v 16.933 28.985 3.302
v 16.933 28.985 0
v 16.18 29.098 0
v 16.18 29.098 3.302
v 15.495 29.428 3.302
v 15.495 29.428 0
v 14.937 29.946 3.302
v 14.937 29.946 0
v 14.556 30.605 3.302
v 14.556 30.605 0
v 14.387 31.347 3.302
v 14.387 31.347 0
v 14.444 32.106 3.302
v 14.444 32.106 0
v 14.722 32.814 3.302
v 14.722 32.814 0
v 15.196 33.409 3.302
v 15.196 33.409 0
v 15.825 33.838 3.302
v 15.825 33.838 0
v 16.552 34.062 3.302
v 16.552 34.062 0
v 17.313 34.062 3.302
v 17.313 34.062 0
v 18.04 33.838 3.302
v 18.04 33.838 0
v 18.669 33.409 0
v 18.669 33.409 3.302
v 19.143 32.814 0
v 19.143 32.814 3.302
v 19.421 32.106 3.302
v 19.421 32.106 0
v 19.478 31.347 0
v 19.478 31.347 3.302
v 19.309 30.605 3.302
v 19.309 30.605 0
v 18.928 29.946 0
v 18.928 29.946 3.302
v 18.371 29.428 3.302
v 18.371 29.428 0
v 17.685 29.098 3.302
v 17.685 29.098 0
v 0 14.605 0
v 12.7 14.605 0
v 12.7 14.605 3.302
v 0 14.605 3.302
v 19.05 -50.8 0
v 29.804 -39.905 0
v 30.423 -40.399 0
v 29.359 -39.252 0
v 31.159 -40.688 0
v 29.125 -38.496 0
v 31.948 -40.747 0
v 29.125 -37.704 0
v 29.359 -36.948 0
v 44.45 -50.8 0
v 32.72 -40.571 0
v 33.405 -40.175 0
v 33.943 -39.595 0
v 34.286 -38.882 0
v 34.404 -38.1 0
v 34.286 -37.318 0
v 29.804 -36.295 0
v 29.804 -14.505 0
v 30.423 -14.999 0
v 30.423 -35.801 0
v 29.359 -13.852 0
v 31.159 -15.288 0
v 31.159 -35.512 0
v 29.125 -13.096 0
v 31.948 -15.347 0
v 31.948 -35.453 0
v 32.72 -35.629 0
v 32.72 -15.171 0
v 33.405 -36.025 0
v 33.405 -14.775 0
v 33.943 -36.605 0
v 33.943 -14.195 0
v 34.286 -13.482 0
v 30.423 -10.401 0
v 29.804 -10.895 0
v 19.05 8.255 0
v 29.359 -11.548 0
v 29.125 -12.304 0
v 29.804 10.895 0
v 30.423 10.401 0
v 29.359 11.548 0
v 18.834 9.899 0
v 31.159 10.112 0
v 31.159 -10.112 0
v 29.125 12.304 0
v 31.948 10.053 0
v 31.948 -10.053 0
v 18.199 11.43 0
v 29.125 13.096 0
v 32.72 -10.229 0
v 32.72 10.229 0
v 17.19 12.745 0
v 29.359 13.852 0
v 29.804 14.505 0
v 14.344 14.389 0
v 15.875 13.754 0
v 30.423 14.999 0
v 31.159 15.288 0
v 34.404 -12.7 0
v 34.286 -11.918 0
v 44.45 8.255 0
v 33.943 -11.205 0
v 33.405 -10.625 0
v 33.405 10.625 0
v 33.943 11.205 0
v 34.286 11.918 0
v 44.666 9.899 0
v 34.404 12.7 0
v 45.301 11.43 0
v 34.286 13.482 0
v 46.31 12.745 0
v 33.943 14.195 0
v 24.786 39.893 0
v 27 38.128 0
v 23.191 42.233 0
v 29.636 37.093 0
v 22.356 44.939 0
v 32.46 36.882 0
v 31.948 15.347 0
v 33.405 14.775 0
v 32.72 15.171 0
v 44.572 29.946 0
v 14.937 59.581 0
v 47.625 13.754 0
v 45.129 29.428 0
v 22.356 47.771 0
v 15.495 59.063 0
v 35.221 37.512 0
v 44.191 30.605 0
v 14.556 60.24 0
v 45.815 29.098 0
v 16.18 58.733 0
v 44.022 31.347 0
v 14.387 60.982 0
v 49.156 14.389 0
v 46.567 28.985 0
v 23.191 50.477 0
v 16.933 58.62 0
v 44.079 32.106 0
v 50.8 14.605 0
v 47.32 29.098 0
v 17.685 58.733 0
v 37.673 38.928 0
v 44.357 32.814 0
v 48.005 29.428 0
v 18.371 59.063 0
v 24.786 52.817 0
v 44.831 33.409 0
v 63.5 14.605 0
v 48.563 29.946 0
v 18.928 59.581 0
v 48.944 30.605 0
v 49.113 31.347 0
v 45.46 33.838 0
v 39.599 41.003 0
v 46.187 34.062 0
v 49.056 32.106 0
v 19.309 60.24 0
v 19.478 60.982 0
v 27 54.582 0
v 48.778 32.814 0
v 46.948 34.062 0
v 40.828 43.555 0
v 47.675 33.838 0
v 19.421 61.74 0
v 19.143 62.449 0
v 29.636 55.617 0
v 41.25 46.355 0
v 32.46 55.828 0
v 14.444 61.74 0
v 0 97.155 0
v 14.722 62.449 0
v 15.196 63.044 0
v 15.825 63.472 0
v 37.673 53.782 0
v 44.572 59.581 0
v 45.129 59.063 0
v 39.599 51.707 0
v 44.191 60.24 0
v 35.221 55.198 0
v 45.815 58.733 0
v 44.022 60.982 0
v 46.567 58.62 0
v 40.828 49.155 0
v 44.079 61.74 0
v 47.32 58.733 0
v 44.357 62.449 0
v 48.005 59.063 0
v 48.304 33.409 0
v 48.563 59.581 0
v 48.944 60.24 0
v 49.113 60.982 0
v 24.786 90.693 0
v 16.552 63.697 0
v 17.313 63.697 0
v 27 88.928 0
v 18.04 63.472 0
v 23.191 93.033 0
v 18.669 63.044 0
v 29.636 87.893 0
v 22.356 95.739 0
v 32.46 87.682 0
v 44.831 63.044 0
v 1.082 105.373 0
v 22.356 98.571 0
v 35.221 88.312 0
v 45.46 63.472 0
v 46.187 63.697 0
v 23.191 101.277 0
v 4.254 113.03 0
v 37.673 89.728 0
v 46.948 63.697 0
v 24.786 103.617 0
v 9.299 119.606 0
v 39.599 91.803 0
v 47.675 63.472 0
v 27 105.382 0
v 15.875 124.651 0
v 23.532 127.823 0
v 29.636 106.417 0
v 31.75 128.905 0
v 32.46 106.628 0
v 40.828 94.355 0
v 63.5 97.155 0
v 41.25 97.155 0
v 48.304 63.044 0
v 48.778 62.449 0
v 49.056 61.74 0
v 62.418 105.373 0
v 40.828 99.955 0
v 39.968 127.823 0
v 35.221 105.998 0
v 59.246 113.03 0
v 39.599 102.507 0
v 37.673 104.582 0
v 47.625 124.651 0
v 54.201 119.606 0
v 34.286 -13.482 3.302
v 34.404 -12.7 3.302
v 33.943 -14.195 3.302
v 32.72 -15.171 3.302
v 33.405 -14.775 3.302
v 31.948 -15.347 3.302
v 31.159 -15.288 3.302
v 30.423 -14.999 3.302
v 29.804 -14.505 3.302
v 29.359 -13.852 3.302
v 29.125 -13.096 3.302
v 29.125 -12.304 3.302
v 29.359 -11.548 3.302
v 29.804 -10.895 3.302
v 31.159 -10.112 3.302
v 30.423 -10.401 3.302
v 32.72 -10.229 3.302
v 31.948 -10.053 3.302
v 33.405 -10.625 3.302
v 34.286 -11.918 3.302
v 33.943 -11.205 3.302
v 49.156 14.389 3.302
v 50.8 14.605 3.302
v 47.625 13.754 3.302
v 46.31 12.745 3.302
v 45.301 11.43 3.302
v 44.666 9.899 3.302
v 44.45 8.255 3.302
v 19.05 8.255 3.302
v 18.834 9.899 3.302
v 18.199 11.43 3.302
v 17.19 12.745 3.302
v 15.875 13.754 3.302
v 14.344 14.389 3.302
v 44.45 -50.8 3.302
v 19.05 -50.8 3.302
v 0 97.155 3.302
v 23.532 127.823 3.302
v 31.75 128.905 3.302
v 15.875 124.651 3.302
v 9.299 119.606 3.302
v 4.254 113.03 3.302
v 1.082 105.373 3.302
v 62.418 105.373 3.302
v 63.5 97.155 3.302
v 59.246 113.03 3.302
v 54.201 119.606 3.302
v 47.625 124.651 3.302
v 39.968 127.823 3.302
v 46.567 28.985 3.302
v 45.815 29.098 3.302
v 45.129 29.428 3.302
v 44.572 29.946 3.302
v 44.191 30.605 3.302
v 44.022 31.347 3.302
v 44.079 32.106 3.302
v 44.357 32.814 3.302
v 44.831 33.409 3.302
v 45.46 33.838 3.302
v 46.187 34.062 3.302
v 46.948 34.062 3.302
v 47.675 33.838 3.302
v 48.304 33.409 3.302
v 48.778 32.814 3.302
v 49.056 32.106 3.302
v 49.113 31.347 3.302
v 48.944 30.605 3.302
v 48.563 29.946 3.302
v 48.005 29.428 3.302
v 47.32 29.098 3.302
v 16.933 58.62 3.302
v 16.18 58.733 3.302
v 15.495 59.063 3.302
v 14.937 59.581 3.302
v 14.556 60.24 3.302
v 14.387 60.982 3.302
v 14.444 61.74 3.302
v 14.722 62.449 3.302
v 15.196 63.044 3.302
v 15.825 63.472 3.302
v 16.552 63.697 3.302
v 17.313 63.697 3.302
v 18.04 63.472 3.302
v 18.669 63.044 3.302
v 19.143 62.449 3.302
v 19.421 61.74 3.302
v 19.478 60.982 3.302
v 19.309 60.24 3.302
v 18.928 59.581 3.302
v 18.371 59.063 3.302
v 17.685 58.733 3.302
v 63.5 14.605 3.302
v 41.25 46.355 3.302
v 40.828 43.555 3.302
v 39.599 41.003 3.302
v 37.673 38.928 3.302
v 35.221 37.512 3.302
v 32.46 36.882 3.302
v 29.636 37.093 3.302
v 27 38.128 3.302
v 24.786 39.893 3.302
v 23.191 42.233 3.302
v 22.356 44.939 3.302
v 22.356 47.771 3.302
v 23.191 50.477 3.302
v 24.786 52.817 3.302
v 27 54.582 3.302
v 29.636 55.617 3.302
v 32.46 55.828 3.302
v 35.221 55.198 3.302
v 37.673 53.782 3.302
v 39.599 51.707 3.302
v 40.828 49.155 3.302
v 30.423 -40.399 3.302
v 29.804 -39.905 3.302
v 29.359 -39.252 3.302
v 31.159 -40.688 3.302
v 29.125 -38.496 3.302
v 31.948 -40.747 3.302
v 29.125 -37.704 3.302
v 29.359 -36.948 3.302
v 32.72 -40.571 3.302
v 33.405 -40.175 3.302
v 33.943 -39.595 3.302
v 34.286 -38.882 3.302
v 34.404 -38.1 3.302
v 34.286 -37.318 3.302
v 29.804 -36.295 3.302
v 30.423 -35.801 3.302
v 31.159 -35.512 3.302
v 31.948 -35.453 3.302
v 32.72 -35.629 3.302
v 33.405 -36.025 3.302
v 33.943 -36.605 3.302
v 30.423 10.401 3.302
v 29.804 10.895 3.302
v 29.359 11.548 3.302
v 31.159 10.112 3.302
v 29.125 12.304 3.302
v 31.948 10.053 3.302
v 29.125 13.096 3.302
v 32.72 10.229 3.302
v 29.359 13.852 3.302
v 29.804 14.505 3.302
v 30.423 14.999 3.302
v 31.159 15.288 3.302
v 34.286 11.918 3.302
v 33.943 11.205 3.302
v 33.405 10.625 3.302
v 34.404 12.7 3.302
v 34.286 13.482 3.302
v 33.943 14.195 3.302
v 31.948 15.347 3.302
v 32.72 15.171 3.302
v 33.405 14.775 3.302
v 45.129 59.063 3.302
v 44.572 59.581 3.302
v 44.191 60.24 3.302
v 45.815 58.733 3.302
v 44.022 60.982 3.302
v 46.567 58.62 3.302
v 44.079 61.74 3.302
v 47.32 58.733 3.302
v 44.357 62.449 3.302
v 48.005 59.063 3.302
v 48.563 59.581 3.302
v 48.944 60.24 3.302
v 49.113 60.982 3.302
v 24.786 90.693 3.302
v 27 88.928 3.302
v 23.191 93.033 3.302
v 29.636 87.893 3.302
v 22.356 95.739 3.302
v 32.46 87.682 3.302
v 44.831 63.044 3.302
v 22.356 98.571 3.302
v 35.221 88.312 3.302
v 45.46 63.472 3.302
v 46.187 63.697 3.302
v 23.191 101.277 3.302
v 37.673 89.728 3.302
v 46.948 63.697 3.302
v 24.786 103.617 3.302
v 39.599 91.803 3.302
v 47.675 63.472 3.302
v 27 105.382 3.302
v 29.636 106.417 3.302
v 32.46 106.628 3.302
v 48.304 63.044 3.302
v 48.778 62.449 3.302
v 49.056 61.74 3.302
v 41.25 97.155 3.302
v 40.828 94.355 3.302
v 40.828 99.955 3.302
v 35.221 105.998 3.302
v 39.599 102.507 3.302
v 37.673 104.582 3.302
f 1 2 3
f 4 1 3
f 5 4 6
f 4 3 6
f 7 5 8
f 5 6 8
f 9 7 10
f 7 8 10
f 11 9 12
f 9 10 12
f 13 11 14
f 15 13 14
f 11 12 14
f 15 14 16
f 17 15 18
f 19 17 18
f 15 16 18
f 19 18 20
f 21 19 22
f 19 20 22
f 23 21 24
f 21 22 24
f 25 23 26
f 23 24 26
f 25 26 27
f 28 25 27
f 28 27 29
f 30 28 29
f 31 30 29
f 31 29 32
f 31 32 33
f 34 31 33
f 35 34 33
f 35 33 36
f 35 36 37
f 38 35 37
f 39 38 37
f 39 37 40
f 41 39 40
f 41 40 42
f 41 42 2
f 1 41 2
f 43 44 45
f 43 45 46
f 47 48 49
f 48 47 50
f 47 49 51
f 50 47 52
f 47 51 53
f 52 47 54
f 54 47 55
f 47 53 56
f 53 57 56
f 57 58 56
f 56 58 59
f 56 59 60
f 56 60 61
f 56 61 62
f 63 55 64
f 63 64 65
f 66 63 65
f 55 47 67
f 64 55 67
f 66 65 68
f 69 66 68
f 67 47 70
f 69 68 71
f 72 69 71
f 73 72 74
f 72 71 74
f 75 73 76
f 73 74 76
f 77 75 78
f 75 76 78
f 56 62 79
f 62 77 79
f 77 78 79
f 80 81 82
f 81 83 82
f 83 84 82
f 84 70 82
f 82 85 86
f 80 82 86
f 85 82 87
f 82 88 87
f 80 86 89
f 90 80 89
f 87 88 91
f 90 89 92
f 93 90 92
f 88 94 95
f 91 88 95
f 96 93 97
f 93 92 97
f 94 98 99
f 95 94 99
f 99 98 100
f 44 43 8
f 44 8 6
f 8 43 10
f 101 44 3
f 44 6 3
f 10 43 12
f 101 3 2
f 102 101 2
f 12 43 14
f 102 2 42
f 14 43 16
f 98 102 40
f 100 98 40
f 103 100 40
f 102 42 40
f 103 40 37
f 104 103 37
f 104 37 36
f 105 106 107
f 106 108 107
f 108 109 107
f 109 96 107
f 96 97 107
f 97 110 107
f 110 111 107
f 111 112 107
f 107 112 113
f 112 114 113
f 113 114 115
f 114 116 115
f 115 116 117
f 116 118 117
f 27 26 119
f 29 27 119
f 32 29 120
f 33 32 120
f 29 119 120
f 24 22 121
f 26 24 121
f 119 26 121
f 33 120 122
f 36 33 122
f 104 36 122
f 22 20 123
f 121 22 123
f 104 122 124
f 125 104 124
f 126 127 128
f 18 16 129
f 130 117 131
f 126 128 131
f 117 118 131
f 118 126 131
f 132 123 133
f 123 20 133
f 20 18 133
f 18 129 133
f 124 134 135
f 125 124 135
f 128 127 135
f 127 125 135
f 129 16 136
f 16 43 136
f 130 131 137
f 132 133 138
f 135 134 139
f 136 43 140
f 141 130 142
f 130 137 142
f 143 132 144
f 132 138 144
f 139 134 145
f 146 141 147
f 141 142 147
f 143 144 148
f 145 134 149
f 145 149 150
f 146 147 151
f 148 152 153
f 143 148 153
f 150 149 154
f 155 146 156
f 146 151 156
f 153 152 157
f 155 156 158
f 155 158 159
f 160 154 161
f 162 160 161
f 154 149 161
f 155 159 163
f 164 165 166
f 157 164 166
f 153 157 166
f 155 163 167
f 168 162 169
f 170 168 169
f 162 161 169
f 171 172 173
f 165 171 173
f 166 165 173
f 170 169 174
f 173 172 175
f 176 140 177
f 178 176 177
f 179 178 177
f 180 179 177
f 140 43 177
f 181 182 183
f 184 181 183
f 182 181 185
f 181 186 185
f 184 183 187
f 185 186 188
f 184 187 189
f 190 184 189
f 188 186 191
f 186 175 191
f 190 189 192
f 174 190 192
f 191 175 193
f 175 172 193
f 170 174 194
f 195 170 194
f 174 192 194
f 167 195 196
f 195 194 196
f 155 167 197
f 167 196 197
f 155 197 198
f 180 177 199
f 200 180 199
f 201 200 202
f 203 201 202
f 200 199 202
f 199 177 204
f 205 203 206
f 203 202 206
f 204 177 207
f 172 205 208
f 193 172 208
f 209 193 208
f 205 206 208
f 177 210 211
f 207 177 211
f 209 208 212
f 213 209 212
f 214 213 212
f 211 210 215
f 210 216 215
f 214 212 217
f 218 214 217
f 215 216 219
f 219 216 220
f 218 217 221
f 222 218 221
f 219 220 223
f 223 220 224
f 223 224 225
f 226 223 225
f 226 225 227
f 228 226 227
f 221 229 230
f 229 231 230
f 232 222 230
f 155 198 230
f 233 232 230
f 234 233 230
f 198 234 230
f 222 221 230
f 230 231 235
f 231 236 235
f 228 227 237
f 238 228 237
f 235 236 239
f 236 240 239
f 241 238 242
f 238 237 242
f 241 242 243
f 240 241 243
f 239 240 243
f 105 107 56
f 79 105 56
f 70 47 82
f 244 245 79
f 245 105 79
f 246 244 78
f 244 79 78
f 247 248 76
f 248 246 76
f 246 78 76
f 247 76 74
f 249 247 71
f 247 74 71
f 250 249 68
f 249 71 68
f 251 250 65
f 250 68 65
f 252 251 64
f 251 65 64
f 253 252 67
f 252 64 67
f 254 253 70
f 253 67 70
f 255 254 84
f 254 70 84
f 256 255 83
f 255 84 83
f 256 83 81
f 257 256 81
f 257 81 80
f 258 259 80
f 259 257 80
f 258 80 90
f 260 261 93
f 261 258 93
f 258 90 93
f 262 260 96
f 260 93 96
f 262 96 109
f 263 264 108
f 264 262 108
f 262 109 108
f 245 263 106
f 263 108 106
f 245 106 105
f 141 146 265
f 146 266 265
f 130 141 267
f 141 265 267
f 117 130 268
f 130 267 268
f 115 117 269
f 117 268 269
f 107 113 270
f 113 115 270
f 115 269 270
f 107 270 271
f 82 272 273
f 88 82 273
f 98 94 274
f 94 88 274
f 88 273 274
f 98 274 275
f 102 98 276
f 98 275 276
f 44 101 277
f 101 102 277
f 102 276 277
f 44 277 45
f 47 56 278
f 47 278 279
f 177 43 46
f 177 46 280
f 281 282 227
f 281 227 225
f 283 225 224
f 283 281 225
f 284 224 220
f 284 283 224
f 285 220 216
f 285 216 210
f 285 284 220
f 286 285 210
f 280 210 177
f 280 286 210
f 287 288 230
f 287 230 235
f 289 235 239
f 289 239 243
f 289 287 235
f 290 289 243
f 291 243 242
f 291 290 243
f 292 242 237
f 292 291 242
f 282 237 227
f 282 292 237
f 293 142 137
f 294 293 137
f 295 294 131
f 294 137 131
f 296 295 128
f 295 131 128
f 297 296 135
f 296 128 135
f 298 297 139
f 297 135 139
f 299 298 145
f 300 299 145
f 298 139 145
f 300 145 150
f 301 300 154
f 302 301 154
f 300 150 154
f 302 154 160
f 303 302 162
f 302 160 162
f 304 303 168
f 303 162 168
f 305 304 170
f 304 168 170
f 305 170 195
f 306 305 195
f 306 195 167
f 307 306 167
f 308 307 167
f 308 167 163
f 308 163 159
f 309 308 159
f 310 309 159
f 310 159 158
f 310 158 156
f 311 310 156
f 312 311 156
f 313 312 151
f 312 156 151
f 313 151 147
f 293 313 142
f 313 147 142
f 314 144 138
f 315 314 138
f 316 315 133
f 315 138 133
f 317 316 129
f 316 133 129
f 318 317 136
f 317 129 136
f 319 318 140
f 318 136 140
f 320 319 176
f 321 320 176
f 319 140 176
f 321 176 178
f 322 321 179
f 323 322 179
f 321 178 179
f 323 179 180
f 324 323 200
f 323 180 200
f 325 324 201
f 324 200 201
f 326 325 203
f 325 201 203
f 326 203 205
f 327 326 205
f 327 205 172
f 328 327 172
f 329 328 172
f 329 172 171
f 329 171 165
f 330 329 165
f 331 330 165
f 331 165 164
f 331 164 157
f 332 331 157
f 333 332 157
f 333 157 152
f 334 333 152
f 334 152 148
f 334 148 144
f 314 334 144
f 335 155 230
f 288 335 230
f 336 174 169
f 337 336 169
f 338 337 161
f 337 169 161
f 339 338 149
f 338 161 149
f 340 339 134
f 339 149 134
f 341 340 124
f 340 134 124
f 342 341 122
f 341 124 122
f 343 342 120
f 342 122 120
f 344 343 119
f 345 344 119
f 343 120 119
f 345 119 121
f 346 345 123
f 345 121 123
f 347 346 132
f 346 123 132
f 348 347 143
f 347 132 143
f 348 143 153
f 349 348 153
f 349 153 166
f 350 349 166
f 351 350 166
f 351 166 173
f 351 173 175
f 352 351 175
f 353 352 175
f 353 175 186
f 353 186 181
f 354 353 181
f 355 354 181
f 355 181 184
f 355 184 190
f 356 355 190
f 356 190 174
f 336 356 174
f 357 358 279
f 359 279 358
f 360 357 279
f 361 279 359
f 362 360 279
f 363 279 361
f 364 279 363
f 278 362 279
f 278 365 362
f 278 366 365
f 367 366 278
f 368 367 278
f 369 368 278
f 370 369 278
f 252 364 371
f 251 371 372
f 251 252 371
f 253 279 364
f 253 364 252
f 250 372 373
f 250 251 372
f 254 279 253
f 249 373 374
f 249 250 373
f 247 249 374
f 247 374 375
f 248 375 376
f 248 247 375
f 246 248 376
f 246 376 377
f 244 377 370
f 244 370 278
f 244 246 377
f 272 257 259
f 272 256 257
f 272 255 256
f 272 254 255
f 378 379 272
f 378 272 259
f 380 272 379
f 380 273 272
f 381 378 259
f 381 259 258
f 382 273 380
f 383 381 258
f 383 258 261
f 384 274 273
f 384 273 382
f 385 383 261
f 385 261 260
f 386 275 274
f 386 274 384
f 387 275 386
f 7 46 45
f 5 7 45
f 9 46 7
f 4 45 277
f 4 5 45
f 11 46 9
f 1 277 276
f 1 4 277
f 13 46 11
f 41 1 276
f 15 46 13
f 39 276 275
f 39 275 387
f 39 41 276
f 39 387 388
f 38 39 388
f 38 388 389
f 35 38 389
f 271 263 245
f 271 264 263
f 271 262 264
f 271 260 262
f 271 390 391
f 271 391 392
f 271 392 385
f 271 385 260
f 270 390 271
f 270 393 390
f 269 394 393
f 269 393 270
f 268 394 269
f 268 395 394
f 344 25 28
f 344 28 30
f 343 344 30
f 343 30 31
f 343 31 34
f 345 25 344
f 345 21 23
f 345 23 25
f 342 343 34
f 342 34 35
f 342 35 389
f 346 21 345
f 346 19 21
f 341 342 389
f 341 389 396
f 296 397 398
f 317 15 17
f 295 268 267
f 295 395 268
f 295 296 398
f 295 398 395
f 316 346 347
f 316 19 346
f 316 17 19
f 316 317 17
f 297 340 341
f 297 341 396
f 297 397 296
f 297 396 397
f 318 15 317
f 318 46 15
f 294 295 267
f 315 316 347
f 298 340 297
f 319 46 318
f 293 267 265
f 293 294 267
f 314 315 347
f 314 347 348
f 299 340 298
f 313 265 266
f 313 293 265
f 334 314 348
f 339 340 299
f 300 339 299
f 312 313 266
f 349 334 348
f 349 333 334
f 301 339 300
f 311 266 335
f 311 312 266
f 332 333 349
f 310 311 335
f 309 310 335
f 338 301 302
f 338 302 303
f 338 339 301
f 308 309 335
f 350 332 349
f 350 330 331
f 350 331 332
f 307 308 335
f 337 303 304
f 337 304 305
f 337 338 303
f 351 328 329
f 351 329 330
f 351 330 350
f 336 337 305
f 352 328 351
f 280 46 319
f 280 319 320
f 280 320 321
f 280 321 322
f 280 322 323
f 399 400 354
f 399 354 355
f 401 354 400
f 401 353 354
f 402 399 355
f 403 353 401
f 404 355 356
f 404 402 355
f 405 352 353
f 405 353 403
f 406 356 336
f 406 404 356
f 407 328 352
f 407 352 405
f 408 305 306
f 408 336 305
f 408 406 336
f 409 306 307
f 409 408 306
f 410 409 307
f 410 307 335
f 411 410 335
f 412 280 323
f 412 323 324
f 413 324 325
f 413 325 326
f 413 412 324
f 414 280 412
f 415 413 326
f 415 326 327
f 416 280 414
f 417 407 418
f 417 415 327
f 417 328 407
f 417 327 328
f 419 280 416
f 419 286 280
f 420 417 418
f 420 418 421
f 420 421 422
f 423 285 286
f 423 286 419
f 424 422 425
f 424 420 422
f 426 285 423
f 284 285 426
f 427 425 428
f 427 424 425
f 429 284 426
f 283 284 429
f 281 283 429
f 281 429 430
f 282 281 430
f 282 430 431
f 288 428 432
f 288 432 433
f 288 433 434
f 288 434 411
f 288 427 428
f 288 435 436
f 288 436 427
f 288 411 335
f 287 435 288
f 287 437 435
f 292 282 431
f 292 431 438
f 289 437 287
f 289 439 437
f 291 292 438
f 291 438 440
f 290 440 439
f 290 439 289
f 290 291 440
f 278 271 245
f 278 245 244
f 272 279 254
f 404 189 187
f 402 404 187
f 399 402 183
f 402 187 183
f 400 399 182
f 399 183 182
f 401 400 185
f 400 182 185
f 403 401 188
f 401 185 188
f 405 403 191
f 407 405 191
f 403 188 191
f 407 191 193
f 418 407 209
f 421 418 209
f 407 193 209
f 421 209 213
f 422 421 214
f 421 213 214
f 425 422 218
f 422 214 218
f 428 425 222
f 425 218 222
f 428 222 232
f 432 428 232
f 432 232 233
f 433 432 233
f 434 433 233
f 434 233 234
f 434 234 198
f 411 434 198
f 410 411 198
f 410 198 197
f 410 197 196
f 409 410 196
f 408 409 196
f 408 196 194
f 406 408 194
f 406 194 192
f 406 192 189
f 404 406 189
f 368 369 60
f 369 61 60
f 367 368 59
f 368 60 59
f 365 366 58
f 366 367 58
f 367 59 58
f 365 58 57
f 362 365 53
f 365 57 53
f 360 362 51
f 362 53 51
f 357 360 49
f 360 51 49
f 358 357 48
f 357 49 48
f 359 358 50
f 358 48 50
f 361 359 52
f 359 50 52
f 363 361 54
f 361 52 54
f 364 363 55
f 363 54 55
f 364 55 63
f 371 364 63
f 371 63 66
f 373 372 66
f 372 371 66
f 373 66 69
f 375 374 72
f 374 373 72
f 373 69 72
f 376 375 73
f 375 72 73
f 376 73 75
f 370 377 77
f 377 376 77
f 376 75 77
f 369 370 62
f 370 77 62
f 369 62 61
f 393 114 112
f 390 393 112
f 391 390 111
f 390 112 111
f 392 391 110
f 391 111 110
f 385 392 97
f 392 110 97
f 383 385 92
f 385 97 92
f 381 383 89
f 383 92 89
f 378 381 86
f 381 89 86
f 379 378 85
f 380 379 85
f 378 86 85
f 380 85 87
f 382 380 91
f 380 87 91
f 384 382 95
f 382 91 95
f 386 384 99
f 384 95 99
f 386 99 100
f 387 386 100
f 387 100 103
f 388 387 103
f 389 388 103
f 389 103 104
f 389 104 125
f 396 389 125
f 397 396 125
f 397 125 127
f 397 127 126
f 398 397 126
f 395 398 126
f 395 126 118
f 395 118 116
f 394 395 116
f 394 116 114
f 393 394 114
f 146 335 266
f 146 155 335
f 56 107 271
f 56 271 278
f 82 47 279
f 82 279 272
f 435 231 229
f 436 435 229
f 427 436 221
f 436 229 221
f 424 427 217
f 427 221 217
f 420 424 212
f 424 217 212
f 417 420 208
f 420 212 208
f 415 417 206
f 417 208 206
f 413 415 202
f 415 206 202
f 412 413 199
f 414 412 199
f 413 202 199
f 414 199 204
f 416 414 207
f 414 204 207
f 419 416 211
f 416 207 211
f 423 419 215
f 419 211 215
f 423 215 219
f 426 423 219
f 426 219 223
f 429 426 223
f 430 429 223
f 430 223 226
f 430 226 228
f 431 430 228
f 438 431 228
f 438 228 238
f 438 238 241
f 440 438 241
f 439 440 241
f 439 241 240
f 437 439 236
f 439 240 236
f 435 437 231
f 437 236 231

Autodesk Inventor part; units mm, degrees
ref_plane "YZ Plane" through (0, 0, 0) normal (1, 0, 0) x (0, 1, 0)
ref_plane "XZ Plane" through (0, 0, 0) normal (0, 1, 0) x (-1, 0, 0)
ref_plane "XY Plane" through (0, 0, 0) normal (0, 0, 1) x (1, 0, 0)
sketch "Sketch1" plane through (0, 0, 0) normal (0, 0, 1) x (1, 0, 0)
  line L0 (63.5, 1.905) -> (63.5, 128.905)
  line L1 (63.5, 128.905) -> (0, 128.905)
  line L2 (0, 128.905) -> (0, 41.0985)
  circle A0 centre (31.75, 97.155) radius 9.5
  circle A1 centre (31.75, 46.355) radius 9.5
  circle A2 centre (31.75, 12.7) radius 2.6543
  line L3 (19.05, 0) -> (19.05, 14.605)
  line L4 (19.05, 25.4) -> (44.45, 25.4)
  line L5 (44.45, 25.4) -> (44.45, 0)
  line L6 (31.75, 0) -> (31.75, 128.905)
  circle A3 centre (31.75, -12.7) radius 2.6543
  circle A4 centre (31.75, -38.1) radius 2.6543
  line L7 (44.45, 0) -> (44.45, -50.8)
  line L8 (44.45, -50.8) -> (19.05, -50.8)
  line L9 (19.05, -50.8) -> (19.05, 0)
  line L10 (0, 41.0985) -> (0, 27.305)
  line L11 (63.5, 14.605) -> (0, 14.605)
  line L12 (0, 14.605) -> (0, 27.305)
  point P0 (0, 0)
  point P1 (63.5, 27.305)
  point P2 (44.45, 14.605)
  point P3 (31.75, -50.8)
  dimension "d0" = 63.5
  dimension "d1" = 127
  dimension "d3" = 116.205
  dimension "d4" = 31.75
  dimension "d5" = 82.55
  dimension "d12" = 19
  dimension "d13" = 19
  dimension "d14" = 5.3086
  dimension "d29" = 25.4
  dimension "d30" = 25.4
  dimension "d31" = 25.4
  dimension "d32" = 25.4
  dimension "d33" = 50.8
  dimension "d36" = 12.7
extrude "Extrusion1" add sketch "Sketch1" along normal blind 3.302 contours L11 L5 L4 L6 A1 A0 L1 L0 | L11 A2 L6 L4 L5 | L5 L7 L8 L9 L3 L11 A2 | L6 A0 A1 A2 L11 L12 L10 L2 L1
fillet "Fillet1" radius 31.75 1 edges at (63.5, 128.905, 1.651)
fillet "Fillet2" radius 31.75 1 edges at (0, 128.905, 1.651)
sketch "Sketch3" plane through (0, 0, 3.302) normal (0, 0, 1) x (1, 0, 0)
  circle A0 centre (31.75, 46.355) radius 9.5 projected
  circle A1 centre (31.75, 46.355) radius 20.955
  line L0 (31.75, 46.355) -> (4.2793, 73.8257)
  line L1 (4.2793, 73.8257) -> (54.0042, 24.1008)
  line L2 (31.75, 46.355) -> (57.6977, 72.3027)
  line L3 (31.75, 46.355) -> (13.6103, 28.2153)
  line L4 (31.75, 46.355) -> (57.4034, 46.355) construction
  point P0 (0, 0)
  point P1 (46.5674, 61.1724)
  point P2 (46.5674, 31.5376)
  point P3 (16.9326, 61.1724)
  point P4 (16.9326, 31.5376)
  dimension "d16" = 41.91
  dimension "d28" = 135
hole "Hole1" at (46.5674, 61.1724, 3.302) at (46.5674, 31.5376, 3.302) at (16.9326, 61.1724, 3.302) at (16.9326, 31.5376, 3.302) direction (0, 0, -1) diameter 5.1054 depth 16.256 tip angle 118 clearance for "Flat Head Machine Screw (82)" size "#10" standard "Ansi Unified Screw Threads"
fillet "Fillet5" radius 6.35 1 edges at (19.05, 14.605, 1.651)
fillet "Fillet6" radius 6.35 1 edges at (44.45, 14.605, 1.651)
equation "\"d13\" = d12"
properties part number "wrist plate 2"
